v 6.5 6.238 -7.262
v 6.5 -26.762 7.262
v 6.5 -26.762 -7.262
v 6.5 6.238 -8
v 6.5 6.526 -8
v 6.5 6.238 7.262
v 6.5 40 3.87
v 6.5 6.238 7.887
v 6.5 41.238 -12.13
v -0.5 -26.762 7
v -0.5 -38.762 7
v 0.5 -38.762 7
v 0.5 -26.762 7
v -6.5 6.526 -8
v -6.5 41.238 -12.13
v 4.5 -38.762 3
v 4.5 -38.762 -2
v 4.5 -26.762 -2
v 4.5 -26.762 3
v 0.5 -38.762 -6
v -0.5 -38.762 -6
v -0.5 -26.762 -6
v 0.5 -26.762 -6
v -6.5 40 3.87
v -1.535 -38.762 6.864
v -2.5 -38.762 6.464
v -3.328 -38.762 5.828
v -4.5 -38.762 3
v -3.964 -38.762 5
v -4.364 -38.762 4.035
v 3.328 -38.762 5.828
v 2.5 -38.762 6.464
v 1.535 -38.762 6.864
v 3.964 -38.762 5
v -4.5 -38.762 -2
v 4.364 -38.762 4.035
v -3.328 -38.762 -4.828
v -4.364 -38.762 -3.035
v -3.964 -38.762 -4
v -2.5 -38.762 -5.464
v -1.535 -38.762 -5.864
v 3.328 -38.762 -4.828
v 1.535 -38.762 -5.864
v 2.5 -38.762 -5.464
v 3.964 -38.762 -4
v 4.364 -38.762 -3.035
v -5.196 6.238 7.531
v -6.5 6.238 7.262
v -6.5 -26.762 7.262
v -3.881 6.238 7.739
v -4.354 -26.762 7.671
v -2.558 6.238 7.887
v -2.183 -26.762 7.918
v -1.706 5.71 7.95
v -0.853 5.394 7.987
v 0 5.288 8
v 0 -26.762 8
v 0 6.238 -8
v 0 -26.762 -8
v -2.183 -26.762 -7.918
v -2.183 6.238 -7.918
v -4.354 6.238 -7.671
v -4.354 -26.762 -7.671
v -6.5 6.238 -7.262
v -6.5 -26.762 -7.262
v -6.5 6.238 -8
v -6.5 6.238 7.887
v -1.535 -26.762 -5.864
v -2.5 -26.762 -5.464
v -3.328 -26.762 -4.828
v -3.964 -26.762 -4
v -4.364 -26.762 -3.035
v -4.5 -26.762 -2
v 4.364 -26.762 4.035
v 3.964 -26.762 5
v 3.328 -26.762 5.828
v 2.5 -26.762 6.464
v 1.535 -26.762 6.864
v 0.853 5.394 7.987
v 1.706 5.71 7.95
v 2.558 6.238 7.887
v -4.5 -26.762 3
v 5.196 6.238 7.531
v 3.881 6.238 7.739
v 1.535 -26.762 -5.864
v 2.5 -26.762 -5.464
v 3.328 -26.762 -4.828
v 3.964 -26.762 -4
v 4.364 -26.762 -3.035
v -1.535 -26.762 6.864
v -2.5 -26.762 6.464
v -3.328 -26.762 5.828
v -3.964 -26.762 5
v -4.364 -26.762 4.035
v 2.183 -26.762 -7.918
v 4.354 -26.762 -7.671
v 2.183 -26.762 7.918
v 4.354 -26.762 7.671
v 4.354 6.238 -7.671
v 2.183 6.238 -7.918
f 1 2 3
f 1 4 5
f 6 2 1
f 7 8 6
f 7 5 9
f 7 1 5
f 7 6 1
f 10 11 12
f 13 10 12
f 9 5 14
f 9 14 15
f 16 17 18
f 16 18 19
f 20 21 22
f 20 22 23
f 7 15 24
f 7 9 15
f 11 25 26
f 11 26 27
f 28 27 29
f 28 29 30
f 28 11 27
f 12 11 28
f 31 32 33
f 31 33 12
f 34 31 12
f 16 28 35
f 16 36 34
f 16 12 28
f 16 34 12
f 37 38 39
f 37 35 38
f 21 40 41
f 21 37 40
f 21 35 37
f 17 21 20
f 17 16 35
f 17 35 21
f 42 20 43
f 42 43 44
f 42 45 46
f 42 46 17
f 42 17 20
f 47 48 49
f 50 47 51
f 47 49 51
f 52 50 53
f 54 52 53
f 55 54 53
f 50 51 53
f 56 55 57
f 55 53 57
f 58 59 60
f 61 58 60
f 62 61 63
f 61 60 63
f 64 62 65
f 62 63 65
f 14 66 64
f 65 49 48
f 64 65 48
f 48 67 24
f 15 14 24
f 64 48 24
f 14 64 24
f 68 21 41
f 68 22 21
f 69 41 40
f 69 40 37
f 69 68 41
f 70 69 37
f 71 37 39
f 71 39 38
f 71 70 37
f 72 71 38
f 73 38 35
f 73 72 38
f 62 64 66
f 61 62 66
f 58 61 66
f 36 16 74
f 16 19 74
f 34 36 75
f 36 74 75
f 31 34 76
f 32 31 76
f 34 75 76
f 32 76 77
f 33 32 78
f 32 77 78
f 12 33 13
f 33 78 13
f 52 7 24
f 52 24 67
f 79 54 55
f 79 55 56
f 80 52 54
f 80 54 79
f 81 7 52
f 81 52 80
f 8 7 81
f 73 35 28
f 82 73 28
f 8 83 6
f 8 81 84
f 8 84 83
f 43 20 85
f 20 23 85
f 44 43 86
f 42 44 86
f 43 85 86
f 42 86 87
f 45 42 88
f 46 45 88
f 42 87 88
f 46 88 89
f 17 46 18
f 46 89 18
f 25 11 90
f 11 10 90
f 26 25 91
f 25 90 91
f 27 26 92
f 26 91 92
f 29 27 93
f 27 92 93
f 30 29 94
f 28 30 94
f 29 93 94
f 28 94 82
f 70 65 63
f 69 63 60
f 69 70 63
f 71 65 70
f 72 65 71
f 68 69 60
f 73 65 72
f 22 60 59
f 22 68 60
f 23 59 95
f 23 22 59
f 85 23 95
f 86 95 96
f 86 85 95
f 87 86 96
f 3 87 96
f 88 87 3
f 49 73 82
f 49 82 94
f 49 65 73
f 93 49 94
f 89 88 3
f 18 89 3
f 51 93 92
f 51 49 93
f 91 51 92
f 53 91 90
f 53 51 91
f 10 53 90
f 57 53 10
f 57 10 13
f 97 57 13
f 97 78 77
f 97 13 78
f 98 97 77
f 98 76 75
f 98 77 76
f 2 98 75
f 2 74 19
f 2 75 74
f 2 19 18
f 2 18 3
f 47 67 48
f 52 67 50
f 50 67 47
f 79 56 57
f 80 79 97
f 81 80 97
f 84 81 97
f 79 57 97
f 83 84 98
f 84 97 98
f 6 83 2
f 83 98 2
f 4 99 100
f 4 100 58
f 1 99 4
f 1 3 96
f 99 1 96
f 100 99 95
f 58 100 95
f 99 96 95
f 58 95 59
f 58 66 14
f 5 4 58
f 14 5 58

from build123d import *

# Parameters (mm, degrees)
F1_DEPTH = 6.5
F2_W     = 13
F2_H     = 16
F2_W_2   = 9
F2_H_2   = 13
F3_DEPTH = 12
F4_R     = 4
F6_DEPTH = 33


with BuildPart() as f1:
    # F0 (on Right) → F1 (new body, symmetric)
    with BuildSketch(Plane.YZ):
        Polygon((5.2879960276, 8), (-38.7622783519, 8), (-38.7622783519, -8), (6.5257176757, -8), (41.2377216481, -12.1299560964), (40, 3.8700439036), align=None)
    extrude(amount=F1_DEPTH, both=True)

    # F2 (on face) → F3 (cut)
    with BuildSketch(Plane.XZ.offset(38.7622783519)):
        Rectangle(F2_W, F2_H)
        with Locations((0, 0.5)):
            Rectangle(F2_W_2, F2_H_2, mode=Mode.SUBTRACT)
    extrude(amount=-F3_DEPTH, mode=Mode.SUBTRACT)

    # F4
    f4_edges = [f1.edges().sort_by_distance(p)[0] for p in [
        (4.5, -32.762278, 7),
        (-4.5, -32.762278, 7),
        (4.5, -32.762278, -6),
        (-4.5, -32.762278, -6),
    ]]
    fillet(f4_edges, radius=F4_R)

    # F5 (on face) → F6 (cut)
    with BuildSketch(Plane.XZ.offset(26.7622783519)):
        with BuildLine():
            ThreePointArc((0, 8), (3.2708714327, 7.8149509816), (6.5, 7.2621655221))
            Line((6.5, 7.2621655221), (6.5, 8))
            Line((6.5, 8), (0, 8))
        make_face()
        with BuildLine():
            ThreePointArc((-6.5, 7.2621655221), (-3.2708714327, 7.8149509816), (0, 8))
            Line((0, 8), (-6.5, 8))
            Line((-6.5, 8), (-6.5, 7.2621655221))
        make_face()
        with BuildLine():
            Line((6.5, -8), (6.5, -7.2621655221))
            ThreePointArc((6.5, -7.2621655221), (3.2708714327, -7.8149509816), (0, -8))
            Line((0, -8), (6.5, -8))
        make_face()
        with BuildLine():
            Line((-6.5, -8), (0, -8))
            ThreePointArc((0, -8), (-3.2708714327, -7.8149509816), (-6.5, -7.2621655221))
            Line((-6.5, -7.2621655221), (-6.5, -8))
        make_face()
    extrude(amount=-F6_DEPTH, mode=Mode.SUBTRACT)


solid = f1.part
